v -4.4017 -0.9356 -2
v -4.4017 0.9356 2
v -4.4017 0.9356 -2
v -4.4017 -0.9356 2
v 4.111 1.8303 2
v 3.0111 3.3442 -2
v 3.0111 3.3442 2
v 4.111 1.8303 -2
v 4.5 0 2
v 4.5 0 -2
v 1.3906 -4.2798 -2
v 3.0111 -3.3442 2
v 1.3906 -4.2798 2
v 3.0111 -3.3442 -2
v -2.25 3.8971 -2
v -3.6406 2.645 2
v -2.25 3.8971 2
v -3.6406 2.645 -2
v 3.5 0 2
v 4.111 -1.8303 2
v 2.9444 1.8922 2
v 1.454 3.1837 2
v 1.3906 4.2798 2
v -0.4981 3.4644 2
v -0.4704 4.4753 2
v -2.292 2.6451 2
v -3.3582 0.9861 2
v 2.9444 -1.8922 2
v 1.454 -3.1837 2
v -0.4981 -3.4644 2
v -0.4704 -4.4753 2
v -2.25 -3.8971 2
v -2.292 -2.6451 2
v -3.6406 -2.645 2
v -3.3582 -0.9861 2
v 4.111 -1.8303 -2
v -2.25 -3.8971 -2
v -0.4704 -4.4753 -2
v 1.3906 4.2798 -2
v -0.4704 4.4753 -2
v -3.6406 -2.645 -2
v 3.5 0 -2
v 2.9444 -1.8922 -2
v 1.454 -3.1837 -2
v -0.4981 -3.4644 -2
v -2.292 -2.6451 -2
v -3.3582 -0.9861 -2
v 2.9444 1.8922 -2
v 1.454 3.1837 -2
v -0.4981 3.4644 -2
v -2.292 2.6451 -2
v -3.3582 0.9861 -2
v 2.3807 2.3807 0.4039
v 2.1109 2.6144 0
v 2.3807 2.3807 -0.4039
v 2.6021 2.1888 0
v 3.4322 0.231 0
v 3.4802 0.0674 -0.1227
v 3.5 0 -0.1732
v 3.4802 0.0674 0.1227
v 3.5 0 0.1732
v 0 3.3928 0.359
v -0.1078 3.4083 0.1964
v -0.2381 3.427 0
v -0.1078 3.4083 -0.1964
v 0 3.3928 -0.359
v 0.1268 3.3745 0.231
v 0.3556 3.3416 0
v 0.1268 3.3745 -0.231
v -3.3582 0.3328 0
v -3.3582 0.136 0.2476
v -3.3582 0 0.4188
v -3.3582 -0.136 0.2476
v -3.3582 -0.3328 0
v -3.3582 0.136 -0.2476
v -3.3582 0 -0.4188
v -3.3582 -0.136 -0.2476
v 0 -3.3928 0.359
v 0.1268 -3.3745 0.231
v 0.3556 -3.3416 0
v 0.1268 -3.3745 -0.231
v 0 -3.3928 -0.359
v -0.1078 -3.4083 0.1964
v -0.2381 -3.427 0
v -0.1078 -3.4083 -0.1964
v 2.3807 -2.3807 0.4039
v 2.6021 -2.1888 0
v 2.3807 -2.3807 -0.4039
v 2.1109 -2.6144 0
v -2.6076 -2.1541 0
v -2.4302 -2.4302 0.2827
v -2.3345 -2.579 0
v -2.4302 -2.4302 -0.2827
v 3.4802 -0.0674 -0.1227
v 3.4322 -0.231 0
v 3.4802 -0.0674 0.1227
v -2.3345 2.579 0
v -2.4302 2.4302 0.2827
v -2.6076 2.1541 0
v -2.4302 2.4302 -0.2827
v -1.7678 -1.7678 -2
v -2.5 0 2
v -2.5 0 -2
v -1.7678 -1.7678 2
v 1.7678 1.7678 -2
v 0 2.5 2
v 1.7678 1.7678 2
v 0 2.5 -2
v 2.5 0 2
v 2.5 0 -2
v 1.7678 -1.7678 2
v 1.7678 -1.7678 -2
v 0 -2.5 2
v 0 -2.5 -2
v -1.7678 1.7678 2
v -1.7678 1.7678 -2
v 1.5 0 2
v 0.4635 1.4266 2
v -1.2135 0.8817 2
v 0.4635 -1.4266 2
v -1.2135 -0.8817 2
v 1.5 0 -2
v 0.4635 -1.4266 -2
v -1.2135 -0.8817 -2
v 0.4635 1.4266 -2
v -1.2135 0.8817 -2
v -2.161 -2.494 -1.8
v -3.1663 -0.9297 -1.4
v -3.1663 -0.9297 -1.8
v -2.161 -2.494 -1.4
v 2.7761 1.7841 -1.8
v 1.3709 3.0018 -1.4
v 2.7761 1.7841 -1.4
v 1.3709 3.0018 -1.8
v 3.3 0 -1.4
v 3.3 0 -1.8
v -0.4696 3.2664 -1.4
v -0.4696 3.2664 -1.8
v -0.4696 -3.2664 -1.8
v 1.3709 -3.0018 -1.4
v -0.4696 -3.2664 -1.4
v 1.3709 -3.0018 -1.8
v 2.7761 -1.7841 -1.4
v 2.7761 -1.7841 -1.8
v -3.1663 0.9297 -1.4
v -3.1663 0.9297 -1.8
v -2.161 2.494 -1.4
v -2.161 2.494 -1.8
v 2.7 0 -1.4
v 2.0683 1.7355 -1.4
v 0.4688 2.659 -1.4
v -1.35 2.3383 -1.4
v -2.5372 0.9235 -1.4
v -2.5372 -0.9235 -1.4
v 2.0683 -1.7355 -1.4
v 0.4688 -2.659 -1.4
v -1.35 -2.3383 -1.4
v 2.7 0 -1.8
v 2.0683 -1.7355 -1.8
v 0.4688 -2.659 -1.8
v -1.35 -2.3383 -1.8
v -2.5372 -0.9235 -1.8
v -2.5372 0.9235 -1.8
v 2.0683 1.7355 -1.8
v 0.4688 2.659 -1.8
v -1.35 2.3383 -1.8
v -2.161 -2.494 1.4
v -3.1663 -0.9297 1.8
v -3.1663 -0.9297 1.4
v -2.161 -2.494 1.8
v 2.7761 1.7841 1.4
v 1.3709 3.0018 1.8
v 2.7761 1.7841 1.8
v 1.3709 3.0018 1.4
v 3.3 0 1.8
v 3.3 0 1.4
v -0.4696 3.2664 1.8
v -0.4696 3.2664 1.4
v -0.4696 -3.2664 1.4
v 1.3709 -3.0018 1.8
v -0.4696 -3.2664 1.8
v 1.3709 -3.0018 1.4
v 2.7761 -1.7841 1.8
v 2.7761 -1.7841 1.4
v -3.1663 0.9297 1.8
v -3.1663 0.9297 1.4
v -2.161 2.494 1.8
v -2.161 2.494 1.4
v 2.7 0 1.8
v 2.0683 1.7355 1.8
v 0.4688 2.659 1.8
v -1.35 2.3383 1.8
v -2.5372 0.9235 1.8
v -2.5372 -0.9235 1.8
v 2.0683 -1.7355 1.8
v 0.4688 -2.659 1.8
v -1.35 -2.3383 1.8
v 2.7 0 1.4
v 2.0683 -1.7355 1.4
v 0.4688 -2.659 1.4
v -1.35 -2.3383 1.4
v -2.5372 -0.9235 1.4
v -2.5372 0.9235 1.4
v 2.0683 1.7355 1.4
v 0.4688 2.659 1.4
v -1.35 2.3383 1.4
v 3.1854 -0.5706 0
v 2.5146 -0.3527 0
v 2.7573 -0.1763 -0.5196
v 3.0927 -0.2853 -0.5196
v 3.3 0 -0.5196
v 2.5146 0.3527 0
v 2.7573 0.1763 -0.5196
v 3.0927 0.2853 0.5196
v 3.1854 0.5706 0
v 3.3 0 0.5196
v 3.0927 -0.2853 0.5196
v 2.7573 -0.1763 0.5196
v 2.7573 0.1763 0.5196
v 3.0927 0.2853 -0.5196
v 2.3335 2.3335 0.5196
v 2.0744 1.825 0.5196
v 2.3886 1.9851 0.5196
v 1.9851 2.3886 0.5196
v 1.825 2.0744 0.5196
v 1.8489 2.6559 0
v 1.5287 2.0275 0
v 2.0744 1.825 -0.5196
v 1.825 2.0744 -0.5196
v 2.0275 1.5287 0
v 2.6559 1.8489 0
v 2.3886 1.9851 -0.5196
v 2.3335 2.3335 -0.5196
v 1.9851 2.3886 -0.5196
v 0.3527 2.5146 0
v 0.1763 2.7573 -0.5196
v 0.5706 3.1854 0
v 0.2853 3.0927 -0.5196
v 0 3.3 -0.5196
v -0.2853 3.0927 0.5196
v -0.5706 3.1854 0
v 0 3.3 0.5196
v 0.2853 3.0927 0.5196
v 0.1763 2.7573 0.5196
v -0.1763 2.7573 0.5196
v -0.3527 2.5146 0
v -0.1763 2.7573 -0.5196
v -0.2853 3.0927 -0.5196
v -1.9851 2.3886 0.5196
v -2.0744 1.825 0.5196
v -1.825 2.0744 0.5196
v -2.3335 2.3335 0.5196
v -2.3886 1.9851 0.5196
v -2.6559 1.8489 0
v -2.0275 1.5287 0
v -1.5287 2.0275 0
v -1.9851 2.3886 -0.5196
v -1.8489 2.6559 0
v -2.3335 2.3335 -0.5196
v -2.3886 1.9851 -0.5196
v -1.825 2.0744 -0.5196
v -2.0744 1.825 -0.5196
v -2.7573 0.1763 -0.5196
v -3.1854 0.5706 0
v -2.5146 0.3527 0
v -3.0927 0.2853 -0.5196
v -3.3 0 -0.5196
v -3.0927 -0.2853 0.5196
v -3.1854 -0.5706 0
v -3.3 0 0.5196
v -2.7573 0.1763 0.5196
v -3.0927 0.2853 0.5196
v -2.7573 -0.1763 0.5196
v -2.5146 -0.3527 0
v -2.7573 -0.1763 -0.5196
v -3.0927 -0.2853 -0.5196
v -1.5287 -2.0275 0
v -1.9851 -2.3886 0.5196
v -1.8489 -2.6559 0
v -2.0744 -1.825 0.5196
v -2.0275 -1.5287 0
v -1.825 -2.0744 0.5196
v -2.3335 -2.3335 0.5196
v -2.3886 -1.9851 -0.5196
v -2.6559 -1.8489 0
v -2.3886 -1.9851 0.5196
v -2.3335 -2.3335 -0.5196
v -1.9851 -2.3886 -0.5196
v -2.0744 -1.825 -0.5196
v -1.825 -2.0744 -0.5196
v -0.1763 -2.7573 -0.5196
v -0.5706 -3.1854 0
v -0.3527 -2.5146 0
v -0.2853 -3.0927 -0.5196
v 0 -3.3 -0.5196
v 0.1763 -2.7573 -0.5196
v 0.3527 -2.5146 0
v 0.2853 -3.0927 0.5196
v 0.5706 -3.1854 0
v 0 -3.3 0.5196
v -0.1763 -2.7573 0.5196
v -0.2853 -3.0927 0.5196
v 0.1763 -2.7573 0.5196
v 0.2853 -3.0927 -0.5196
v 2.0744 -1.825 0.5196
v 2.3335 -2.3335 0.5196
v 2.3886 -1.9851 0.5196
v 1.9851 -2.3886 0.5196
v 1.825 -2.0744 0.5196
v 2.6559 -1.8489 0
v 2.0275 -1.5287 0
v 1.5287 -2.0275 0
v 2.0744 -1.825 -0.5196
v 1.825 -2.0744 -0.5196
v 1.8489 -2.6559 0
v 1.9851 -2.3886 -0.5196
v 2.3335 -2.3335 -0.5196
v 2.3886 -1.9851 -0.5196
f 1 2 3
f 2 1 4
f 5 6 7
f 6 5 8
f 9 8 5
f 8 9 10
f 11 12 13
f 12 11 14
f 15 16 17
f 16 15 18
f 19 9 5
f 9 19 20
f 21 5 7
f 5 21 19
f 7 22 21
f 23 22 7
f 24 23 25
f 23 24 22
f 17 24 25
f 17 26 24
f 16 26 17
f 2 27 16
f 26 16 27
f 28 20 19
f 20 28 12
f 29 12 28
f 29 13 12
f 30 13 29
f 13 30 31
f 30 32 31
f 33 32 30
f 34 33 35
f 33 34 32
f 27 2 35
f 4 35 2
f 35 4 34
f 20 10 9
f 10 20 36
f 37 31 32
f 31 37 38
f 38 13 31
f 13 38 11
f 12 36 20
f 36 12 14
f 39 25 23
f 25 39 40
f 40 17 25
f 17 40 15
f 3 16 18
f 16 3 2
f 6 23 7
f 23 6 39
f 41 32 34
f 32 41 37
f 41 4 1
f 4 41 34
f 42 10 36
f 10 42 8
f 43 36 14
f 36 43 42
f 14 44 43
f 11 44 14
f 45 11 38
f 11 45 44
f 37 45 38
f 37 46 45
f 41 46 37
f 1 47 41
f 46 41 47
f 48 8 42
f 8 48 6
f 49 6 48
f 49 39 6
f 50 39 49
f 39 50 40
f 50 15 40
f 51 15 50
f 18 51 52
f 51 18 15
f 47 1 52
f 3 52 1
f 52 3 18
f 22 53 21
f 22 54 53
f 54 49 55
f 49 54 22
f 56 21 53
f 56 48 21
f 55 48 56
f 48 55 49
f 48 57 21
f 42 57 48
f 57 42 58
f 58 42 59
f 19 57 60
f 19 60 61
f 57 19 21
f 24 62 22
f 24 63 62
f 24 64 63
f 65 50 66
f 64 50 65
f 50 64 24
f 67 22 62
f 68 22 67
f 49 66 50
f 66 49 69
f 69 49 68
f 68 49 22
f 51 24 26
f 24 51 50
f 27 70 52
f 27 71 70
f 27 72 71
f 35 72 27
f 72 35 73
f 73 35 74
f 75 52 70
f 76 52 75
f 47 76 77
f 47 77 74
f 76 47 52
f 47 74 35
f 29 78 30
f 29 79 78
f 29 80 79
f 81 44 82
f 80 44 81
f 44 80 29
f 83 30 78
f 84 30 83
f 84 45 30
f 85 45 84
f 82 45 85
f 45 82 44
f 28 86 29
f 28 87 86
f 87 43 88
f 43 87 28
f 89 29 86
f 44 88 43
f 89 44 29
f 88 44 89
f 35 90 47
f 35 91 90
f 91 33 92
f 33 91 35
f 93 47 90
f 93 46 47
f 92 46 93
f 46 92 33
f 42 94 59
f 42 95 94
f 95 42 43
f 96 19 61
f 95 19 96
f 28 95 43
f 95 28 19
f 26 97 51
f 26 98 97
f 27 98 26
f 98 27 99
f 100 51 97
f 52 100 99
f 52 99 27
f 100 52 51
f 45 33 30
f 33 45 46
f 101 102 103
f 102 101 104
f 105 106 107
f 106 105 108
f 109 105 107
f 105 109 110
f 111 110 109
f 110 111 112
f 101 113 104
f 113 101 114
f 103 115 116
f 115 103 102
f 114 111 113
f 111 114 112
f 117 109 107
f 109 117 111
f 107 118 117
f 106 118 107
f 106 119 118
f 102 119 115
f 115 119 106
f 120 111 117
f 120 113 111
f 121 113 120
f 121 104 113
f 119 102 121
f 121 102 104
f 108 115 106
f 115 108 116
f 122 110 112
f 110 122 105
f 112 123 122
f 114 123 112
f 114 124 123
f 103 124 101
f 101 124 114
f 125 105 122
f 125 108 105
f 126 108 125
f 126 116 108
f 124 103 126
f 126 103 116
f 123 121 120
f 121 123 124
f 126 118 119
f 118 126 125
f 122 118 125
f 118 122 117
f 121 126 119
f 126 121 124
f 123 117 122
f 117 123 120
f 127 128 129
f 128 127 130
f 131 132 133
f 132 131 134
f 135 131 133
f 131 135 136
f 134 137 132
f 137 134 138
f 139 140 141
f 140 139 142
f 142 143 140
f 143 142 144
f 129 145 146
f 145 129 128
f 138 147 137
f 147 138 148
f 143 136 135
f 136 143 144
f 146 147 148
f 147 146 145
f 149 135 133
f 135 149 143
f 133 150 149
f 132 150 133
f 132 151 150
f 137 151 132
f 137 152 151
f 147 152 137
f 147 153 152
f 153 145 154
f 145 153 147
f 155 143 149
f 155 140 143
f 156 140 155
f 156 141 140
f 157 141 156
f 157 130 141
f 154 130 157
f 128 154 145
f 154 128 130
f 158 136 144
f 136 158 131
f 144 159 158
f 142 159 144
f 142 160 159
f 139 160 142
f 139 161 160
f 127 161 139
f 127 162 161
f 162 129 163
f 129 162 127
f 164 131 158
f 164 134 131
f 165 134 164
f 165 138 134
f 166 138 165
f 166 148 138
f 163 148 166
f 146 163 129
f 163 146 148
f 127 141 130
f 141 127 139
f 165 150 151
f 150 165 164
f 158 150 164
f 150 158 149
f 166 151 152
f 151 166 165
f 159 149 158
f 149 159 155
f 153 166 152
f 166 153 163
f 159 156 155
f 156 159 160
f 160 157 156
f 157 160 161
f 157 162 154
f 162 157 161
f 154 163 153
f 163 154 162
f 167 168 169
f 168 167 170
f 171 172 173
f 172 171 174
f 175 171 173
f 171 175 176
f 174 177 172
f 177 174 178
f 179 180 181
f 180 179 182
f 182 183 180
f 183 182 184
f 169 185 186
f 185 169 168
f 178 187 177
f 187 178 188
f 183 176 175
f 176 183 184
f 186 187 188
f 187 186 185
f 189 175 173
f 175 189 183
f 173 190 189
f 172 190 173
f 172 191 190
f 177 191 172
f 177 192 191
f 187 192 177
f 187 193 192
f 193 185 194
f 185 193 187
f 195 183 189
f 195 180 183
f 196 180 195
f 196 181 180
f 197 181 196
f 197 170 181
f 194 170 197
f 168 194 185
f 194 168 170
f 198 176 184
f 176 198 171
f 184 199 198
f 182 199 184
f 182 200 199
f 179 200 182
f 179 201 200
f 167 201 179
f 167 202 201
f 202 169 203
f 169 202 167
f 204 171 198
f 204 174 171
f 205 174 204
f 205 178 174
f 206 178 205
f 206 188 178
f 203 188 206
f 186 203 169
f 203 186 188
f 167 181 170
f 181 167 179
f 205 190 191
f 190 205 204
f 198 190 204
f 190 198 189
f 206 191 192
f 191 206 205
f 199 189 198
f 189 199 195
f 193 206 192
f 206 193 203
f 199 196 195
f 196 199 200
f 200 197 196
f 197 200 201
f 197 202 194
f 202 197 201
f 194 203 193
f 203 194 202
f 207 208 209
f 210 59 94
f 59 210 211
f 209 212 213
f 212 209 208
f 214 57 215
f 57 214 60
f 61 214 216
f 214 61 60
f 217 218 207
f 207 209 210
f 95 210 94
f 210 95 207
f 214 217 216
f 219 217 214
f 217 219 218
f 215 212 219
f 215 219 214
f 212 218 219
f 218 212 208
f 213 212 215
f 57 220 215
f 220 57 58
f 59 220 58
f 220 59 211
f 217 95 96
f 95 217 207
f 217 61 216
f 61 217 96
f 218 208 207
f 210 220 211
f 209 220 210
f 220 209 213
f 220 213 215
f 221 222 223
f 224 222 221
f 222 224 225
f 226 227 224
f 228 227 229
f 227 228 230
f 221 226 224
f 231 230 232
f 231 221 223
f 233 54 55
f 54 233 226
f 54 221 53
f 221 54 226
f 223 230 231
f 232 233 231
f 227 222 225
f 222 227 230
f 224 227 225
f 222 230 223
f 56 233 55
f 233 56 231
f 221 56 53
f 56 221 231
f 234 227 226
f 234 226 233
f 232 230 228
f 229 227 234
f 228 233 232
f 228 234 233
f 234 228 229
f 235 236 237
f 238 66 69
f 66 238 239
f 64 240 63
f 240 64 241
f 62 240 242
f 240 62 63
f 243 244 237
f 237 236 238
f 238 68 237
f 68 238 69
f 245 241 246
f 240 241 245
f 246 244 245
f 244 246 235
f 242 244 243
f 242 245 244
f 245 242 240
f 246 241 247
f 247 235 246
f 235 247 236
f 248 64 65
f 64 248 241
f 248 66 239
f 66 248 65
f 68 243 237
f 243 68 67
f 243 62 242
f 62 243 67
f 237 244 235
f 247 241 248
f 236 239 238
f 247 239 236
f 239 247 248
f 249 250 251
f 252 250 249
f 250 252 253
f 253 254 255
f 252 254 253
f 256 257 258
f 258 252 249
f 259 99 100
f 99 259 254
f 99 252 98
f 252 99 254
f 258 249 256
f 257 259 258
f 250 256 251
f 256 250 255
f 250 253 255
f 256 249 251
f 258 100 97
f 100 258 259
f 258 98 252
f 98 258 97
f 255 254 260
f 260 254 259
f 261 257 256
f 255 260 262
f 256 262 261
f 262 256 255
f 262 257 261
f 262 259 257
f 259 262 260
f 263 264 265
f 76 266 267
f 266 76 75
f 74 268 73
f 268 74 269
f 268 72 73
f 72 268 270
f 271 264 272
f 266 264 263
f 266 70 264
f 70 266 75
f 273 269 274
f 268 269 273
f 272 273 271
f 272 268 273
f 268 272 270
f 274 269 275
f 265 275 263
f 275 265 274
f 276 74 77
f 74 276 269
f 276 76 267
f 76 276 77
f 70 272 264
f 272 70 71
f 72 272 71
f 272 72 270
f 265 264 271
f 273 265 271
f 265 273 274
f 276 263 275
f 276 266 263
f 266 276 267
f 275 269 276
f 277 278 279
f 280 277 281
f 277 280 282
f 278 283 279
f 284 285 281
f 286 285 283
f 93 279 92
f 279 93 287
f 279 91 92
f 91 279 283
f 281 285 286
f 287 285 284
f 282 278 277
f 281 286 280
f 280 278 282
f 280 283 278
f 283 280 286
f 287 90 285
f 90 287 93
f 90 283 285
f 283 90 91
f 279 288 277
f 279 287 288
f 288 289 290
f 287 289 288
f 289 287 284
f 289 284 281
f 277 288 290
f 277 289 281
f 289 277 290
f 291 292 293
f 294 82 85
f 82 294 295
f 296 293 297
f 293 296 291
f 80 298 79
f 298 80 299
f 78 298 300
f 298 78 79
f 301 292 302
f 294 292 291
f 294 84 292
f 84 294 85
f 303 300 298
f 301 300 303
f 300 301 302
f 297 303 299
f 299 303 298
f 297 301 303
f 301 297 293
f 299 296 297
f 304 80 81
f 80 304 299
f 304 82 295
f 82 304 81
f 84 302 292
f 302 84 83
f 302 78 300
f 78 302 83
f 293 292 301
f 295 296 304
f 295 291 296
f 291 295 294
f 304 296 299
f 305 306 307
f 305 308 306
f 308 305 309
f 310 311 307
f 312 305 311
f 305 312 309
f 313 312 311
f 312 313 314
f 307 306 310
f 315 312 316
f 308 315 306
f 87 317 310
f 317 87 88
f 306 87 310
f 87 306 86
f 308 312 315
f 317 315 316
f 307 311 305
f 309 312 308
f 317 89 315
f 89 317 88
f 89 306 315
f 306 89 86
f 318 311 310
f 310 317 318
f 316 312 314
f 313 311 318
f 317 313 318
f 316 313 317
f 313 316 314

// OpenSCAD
// Parameters
bore_diameter_mm = 3.0; //[1.5:6.0:0.1]
outer_diameter_mm = 9.0; //[4.5:18.0:0.1]
width_mm = 4.0; //[2.0:8.0:0.1]
race_radial_thickness_mm = 1.0; //[0.6:2.0:0.1]
shield_thickness_mm = 0.4; //[0.2:1.0:0.05]
shield_radial_gap_mm = 0.2; //[0.1:0.6:0.05]
shield_inner_clearance_mm = 0.2; //[0.1:0.6:0.05]
ball_diameter_mm = 1.2; //[0.6:2.4:0.05]
ball_count = 8; //[6:14:1]
ball_radial_overlap_mm = 0.3; //[0.1:0.8:0.05]
eps_mm = 0.2; //[0.05:0.5:0.05]

// Bearing Ball - complete geometry
module bearing_ball() {
  color("Silver") {
    sphere(r=ball_diameter_mm/2);
  }
}

// Ball Bearing - complete geometry
module ball_bearing() {
  color("DimGray") {
    // Outer Race
    difference() {
      cylinder(r=outer_diameter_mm/2, h=width_mm, center=true);
      cylinder(r=outer_diameter_mm/2 - race_radial_thickness_mm, h=width_mm + 2*eps_mm, center=true);
    }
    // Inner Race
    difference() {
      cylinder(r=bore_diameter_mm/2 + race_radial_thickness_mm, h=width_mm, center=true);
      cylinder(r=bore_diameter_mm/2, h=width_mm + 2*eps_mm, center=true);
    }
    // Shields
    for (z = [-1, 1]) {
      translate([0, 0, z * (width_mm/2 - shield_thickness_mm/2 - eps_mm)]) {
        difference() {
          cylinder(r=outer_diameter_mm/2 - race_radial_thickness_mm - shield_radial_gap_mm, h=shield_thickness_mm, center=true);
          cylinder(r=bore_diameter_mm/2 + race_radial_thickness_mm + shield_inner_clearance_mm, h=shield_thickness_mm + 2*eps_mm, center=true);
        }
      }
    }
    // Bearing Balls
    for (i = [0:ball_count-1]) {
      rotate([0, 0, i*360/ball_count]) {
        translate([((bore_diameter_mm/2 + race_radial_thickness_mm) + (outer_diameter_mm/2 - race_radial_thickness_mm))/2, 0, 0]) {
          bearing_ball();
        }
      }
    }
  }
}

// Assembly
module assembly() {
  ball_bearing();
}

assembly();
